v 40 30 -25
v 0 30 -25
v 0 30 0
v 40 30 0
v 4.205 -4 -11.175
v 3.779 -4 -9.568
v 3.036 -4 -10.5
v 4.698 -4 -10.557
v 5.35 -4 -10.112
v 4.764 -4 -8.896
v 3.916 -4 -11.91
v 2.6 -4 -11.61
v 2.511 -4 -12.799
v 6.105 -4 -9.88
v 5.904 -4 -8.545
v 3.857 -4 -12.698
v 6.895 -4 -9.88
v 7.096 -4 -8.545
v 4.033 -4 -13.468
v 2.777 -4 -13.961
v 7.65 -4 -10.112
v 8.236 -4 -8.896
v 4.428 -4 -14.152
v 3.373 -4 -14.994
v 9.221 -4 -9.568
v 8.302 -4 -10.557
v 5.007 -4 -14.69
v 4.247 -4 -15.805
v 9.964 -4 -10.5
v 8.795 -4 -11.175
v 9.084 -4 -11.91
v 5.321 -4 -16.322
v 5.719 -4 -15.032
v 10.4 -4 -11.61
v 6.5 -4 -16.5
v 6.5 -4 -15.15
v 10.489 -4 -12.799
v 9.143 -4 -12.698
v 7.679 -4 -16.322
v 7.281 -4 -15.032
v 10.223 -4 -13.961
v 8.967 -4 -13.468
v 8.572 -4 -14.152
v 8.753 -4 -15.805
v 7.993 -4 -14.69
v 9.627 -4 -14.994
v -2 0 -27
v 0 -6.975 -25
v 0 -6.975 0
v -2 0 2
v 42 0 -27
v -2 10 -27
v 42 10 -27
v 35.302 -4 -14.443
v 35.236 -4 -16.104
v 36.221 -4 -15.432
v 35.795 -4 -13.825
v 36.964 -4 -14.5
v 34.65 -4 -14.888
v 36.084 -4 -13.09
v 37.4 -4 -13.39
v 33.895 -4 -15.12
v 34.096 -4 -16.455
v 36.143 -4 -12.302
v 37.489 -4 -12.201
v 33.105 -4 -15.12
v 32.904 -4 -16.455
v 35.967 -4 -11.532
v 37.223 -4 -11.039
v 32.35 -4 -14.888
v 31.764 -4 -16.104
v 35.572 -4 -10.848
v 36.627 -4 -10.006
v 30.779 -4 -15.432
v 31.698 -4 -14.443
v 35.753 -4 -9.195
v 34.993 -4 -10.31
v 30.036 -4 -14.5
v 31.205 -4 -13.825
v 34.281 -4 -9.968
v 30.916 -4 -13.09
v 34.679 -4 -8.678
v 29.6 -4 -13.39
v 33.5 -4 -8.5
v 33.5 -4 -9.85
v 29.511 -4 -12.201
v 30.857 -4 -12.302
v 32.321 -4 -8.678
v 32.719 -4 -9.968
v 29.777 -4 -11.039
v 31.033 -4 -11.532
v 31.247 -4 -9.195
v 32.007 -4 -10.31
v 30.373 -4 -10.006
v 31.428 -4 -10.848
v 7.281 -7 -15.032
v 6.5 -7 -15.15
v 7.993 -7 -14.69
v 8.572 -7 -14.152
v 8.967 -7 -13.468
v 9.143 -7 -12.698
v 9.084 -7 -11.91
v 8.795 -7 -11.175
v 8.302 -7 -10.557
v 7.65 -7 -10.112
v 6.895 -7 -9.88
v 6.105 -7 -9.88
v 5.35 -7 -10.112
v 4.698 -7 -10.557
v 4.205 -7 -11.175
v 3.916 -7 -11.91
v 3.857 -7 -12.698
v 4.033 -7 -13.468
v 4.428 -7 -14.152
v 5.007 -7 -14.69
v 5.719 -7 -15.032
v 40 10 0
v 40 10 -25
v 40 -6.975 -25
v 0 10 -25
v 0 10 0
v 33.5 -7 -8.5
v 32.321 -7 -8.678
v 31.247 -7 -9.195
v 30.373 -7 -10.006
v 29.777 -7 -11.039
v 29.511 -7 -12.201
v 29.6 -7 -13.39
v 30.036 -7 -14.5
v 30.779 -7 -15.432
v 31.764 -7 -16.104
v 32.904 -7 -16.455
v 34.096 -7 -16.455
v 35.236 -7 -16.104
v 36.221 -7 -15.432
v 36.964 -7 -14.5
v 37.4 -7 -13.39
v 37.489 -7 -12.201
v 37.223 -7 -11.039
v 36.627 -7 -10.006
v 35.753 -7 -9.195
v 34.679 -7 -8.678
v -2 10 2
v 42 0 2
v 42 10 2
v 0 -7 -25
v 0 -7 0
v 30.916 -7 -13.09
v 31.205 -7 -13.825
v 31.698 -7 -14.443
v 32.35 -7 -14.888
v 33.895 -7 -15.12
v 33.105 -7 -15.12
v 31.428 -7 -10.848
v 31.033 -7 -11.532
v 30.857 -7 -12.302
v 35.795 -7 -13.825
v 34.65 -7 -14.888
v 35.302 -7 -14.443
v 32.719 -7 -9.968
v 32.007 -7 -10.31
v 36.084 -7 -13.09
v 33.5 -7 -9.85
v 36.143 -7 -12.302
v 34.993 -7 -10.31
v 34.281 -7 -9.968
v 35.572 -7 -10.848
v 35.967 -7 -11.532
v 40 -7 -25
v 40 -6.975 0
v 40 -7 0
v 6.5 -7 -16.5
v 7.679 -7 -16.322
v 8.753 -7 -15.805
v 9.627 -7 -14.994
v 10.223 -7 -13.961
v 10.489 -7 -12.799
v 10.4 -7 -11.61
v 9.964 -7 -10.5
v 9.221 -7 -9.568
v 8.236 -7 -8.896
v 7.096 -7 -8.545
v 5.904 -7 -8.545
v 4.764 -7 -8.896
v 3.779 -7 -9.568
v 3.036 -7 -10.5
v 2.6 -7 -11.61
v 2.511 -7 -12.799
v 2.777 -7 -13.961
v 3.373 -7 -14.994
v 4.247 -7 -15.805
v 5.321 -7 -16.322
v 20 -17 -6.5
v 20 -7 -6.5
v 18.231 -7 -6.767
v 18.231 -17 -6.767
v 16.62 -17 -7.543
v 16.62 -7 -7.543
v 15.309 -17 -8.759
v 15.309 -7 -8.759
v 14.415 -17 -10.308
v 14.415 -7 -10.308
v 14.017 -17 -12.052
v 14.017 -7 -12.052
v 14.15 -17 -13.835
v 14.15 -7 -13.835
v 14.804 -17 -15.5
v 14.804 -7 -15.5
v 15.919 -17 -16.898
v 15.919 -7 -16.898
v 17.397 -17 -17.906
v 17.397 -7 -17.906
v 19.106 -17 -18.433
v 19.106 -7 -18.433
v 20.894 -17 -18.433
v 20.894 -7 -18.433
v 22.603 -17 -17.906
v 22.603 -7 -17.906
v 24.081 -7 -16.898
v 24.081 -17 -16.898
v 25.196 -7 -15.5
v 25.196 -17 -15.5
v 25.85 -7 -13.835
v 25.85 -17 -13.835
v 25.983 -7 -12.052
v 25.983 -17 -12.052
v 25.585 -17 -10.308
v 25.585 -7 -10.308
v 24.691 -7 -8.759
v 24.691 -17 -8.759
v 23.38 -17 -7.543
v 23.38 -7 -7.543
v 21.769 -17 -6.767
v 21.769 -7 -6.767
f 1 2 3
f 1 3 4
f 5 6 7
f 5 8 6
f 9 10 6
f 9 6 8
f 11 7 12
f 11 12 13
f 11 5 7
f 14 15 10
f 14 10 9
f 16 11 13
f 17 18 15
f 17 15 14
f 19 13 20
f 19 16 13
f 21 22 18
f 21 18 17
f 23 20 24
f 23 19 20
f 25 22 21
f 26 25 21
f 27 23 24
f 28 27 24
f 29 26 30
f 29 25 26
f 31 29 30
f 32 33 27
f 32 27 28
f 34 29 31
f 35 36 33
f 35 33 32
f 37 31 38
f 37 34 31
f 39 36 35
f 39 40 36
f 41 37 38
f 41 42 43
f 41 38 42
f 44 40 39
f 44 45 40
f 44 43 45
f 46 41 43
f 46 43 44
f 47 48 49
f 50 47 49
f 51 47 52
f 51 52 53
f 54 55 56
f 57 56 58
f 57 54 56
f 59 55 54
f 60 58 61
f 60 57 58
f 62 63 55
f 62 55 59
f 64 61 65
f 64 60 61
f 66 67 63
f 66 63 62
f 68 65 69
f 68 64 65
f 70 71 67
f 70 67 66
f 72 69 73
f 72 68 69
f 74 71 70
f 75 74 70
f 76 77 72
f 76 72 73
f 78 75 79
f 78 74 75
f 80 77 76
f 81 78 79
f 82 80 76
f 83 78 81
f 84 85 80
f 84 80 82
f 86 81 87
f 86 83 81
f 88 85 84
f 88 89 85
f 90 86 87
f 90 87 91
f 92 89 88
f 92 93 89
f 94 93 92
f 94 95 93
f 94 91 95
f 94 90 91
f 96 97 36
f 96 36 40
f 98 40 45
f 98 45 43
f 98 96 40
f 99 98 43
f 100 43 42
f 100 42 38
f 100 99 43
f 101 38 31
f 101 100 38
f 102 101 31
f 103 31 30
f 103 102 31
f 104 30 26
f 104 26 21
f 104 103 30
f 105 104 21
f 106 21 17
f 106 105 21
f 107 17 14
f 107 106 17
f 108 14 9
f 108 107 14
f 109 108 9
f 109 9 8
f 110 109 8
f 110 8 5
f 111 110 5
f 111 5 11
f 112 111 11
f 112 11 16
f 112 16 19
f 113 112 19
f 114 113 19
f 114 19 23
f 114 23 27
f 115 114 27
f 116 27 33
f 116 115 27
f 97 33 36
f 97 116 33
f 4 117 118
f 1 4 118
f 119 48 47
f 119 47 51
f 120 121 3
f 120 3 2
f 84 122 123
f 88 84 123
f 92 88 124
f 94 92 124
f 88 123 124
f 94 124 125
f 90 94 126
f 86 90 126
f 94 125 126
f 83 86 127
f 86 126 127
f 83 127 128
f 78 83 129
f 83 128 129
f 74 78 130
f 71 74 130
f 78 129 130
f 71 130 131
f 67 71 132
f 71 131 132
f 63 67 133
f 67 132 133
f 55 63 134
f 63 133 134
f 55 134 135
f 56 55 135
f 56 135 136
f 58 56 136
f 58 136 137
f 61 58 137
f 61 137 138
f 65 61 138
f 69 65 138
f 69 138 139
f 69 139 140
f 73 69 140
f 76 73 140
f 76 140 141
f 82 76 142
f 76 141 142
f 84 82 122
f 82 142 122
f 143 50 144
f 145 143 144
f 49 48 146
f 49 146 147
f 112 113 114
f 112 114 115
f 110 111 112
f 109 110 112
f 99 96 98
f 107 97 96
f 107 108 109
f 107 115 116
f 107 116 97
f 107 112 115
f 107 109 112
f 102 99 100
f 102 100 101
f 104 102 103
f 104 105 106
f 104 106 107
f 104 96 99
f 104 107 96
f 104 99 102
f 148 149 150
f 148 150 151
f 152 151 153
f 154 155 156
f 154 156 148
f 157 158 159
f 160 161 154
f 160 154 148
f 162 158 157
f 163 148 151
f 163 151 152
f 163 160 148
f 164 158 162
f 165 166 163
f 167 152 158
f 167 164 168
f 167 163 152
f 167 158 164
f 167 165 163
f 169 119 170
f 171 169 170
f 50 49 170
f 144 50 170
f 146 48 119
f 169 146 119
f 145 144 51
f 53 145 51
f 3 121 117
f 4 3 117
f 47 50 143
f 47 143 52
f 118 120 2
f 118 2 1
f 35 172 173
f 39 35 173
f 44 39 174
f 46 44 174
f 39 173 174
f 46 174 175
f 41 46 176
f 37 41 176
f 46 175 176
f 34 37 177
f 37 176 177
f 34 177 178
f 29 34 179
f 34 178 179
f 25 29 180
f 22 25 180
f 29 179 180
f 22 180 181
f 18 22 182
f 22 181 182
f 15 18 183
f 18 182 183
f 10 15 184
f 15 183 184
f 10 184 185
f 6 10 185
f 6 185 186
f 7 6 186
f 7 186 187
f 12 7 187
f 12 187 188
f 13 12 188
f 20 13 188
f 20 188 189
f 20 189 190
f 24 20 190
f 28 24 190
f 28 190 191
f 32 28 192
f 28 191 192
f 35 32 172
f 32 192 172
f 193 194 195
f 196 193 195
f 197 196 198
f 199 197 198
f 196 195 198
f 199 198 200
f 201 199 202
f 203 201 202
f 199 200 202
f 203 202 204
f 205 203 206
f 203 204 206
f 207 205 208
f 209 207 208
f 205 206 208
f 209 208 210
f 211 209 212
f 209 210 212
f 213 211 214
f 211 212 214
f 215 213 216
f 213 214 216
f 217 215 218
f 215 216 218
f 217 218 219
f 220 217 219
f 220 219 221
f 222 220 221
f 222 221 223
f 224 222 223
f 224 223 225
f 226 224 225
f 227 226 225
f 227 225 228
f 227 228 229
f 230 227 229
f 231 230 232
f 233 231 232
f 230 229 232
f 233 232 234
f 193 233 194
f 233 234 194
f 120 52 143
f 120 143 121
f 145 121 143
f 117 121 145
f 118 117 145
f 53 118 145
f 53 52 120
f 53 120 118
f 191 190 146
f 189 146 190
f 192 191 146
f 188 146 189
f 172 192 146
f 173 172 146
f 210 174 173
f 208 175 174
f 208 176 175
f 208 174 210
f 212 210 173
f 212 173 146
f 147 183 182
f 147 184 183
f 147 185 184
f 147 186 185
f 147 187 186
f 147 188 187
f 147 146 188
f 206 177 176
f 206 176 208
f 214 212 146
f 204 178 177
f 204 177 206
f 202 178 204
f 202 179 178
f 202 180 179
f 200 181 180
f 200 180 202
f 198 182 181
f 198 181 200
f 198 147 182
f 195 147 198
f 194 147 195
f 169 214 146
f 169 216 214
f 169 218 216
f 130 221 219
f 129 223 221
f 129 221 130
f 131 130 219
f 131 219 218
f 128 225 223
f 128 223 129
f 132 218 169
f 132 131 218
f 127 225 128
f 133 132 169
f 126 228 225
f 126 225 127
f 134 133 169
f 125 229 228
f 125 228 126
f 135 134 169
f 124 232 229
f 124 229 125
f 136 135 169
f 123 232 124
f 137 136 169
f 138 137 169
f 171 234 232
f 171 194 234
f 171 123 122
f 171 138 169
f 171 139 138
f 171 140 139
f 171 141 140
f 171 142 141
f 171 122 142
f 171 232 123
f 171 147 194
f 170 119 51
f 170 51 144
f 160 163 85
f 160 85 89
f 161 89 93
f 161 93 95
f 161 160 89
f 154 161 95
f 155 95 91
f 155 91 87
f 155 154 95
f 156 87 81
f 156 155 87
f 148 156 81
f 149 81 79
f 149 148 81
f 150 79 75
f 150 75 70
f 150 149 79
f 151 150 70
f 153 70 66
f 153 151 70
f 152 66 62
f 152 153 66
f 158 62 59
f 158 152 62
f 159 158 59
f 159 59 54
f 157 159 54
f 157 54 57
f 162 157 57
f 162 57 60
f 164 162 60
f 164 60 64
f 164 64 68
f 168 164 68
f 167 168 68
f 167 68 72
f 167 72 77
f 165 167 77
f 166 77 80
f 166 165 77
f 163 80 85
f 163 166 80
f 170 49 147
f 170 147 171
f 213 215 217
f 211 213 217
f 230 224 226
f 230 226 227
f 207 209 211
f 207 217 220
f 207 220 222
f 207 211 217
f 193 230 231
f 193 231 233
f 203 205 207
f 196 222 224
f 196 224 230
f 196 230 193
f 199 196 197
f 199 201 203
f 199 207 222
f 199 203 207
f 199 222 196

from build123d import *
from OCP.BRepFilletAPI import BRepFilletAPI_MakeChamfer

# Parameters (mm, degrees)
SKETCH1_W           = 40
SKETCH1_H           = 25
BOSS_EXTRUDE1_DEPTH = 30
SKETCH2_W           = 44
SKETCH2_H           = 29
BOSS_EXTRUDE2_DEPTH = 10
SKETCH3_W           = 40
SKETCH3_H           = 25
BOSS_EXTRUDE3_DEPTH = 14
SKETCH4_W           = 40
SKETCH4_H           = 25
CUT_EXTRUDE1_DEPTH  = 7
SKETCH5_R           = 4
SKETCH5_R_2         = 2.65
CUT_EXTRUDE2_DEPTH  = 3
SKETCH6_R           = 6
BOSS_EXTRUDE4_DEPTH = 10
CHAMFER1_SIZE       = 2
CHAMFER1_SIZE_2     = 6.974828888


with BuildPart() as part:
    # Sketch1 → Boss-Extrude1 (new body)
    with BuildSketch(Plane(origin=(0, 0, 0), x_dir=(1, 0, 0), z_dir=(0, 1, 0))):
        with Locations((20, 12.5)):
            Rectangle(SKETCH1_W, SKETCH1_H)
    extrude(amount=BOSS_EXTRUDE1_DEPTH)

    # Sketch2 → Boss-Extrude2 (add)
    with BuildSketch(Plane(origin=(0, 0, 0), x_dir=(1, 0, 0), z_dir=(0, 1, 0))):
        with Locations((20, 12.5)):
            Rectangle(SKETCH2_W, SKETCH2_H)
    extrude(amount=BOSS_EXTRUDE2_DEPTH)

    # Sketch3 → Boss-Extrude3 (add)
    with BuildSketch(Plane.XZ):
        with Locations((20, -12.5)):
            Rectangle(SKETCH3_W, SKETCH3_H)
    extrude(amount=BOSS_EXTRUDE3_DEPTH)

    # Sketch4 → Cut-Extrude1 (cut)
    with BuildSketch(Plane.XZ.offset(14)):
        with Locations((20, -12.5)):
            Rectangle(SKETCH4_W, SKETCH4_H)
    extrude(amount=-CUT_EXTRUDE1_DEPTH, mode=Mode.SUBTRACT)

    # Sketch5 → Cut-Extrude2 (cut)
    # profile 1 of 2: a face of its own
    with BuildSketch(Plane.XZ.offset(7)):
        with Locations(Location((6.5, -12.5, 0), (0, 0, 270))):
            Circle(SKETCH5_R)
        with Locations(Location((6.5, -12.5, 0), (0, 0, 270))):
            Circle(SKETCH5_R_2, mode=Mode.SUBTRACT)
    # profile 2 of 2: a face of its own
    with BuildSketch(Plane.XZ.offset(7)):
        with Locations(Location((33.5, -12.5, 0), (0, 0, 90))):
            Circle(SKETCH5_R)
        with Locations(Location((33.5, -12.5, 0), (0, 0, 90))):
            Circle(SKETCH5_R_2, mode=Mode.SUBTRACT)
    extrude(amount=-CUT_EXTRUDE2_DEPTH, mode=Mode.SUBTRACT)

    # Sketch6 → Boss-Extrude4 (add)
    with BuildSketch(Plane.XZ.offset(7)):
        with Locations(Location((20, -12.5, 0), (0, 0, 90))):
            Circle(SKETCH6_R)
    extrude(amount=BOSS_EXTRUDE4_DEPTH)

    # Chamfer1
    chamfer1_edges_1 = [part.edges().sort_by_distance(p)[0] for p in [
        (0, 0, -12.5),
    ]]
    chamfer1_side_1 = [part.faces().sort_by_distance(p)[0] for p in [
        (-0.04, 0, -12.5),
    ]]
    chamfer1_edges_2 = [part.edges().sort_by_distance(p)[0] for p in [
        (20, 0, -25),
    ]]
    chamfer1_side_2 = [part.faces().sort_by_distance(p)[0] for p in [
        (20, 0, -25.04),
    ]]
    chamfer1_edges_3 = [part.edges().sort_by_distance(p)[0] for p in [
        (40, 0, -12.5),
    ]]
    chamfer1_side_3 = [part.faces().sort_by_distance(p)[0] for p in [
        (40.04, 0, -12.5),
    ]]
    chamfer1_edges_4 = [part.edges().sort_by_distance(p)[0] for p in [
        (20, 0, 0),
    ]]
    chamfer1_side_4 = [part.faces().sort_by_distance(p)[0] for p in [
        (20, 0, 0.04),
    ]]
    chamfer1 = BRepFilletAPI_MakeChamfer(part.part.solid().wrapped)
    for e in chamfer1_edges_1:
        chamfer1.Add(CHAMFER1_SIZE - 0.0001, CHAMFER1_SIZE_2 - 0.0001, e.wrapped, chamfer1_side_1[0].wrapped)
    for e in chamfer1_edges_2:
        chamfer1.Add(CHAMFER1_SIZE - 0.0001, CHAMFER1_SIZE_2 - 0.0001, e.wrapped, chamfer1_side_2[0].wrapped)
    for e in chamfer1_edges_3:
        chamfer1.Add(CHAMFER1_SIZE - 0.0001, CHAMFER1_SIZE_2 - 0.0001, e.wrapped, chamfer1_side_3[0].wrapped)
    for e in chamfer1_edges_4:
        chamfer1.Add(CHAMFER1_SIZE - 0.0001, CHAMFER1_SIZE_2 - 0.0001, e.wrapped, chamfer1_side_4[0].wrapped)
    add(Compound.cast(chamfer1.Shape()), mode=Mode.REPLACE)  # a hair under: the kernel refuses the full size


solid = part.part
